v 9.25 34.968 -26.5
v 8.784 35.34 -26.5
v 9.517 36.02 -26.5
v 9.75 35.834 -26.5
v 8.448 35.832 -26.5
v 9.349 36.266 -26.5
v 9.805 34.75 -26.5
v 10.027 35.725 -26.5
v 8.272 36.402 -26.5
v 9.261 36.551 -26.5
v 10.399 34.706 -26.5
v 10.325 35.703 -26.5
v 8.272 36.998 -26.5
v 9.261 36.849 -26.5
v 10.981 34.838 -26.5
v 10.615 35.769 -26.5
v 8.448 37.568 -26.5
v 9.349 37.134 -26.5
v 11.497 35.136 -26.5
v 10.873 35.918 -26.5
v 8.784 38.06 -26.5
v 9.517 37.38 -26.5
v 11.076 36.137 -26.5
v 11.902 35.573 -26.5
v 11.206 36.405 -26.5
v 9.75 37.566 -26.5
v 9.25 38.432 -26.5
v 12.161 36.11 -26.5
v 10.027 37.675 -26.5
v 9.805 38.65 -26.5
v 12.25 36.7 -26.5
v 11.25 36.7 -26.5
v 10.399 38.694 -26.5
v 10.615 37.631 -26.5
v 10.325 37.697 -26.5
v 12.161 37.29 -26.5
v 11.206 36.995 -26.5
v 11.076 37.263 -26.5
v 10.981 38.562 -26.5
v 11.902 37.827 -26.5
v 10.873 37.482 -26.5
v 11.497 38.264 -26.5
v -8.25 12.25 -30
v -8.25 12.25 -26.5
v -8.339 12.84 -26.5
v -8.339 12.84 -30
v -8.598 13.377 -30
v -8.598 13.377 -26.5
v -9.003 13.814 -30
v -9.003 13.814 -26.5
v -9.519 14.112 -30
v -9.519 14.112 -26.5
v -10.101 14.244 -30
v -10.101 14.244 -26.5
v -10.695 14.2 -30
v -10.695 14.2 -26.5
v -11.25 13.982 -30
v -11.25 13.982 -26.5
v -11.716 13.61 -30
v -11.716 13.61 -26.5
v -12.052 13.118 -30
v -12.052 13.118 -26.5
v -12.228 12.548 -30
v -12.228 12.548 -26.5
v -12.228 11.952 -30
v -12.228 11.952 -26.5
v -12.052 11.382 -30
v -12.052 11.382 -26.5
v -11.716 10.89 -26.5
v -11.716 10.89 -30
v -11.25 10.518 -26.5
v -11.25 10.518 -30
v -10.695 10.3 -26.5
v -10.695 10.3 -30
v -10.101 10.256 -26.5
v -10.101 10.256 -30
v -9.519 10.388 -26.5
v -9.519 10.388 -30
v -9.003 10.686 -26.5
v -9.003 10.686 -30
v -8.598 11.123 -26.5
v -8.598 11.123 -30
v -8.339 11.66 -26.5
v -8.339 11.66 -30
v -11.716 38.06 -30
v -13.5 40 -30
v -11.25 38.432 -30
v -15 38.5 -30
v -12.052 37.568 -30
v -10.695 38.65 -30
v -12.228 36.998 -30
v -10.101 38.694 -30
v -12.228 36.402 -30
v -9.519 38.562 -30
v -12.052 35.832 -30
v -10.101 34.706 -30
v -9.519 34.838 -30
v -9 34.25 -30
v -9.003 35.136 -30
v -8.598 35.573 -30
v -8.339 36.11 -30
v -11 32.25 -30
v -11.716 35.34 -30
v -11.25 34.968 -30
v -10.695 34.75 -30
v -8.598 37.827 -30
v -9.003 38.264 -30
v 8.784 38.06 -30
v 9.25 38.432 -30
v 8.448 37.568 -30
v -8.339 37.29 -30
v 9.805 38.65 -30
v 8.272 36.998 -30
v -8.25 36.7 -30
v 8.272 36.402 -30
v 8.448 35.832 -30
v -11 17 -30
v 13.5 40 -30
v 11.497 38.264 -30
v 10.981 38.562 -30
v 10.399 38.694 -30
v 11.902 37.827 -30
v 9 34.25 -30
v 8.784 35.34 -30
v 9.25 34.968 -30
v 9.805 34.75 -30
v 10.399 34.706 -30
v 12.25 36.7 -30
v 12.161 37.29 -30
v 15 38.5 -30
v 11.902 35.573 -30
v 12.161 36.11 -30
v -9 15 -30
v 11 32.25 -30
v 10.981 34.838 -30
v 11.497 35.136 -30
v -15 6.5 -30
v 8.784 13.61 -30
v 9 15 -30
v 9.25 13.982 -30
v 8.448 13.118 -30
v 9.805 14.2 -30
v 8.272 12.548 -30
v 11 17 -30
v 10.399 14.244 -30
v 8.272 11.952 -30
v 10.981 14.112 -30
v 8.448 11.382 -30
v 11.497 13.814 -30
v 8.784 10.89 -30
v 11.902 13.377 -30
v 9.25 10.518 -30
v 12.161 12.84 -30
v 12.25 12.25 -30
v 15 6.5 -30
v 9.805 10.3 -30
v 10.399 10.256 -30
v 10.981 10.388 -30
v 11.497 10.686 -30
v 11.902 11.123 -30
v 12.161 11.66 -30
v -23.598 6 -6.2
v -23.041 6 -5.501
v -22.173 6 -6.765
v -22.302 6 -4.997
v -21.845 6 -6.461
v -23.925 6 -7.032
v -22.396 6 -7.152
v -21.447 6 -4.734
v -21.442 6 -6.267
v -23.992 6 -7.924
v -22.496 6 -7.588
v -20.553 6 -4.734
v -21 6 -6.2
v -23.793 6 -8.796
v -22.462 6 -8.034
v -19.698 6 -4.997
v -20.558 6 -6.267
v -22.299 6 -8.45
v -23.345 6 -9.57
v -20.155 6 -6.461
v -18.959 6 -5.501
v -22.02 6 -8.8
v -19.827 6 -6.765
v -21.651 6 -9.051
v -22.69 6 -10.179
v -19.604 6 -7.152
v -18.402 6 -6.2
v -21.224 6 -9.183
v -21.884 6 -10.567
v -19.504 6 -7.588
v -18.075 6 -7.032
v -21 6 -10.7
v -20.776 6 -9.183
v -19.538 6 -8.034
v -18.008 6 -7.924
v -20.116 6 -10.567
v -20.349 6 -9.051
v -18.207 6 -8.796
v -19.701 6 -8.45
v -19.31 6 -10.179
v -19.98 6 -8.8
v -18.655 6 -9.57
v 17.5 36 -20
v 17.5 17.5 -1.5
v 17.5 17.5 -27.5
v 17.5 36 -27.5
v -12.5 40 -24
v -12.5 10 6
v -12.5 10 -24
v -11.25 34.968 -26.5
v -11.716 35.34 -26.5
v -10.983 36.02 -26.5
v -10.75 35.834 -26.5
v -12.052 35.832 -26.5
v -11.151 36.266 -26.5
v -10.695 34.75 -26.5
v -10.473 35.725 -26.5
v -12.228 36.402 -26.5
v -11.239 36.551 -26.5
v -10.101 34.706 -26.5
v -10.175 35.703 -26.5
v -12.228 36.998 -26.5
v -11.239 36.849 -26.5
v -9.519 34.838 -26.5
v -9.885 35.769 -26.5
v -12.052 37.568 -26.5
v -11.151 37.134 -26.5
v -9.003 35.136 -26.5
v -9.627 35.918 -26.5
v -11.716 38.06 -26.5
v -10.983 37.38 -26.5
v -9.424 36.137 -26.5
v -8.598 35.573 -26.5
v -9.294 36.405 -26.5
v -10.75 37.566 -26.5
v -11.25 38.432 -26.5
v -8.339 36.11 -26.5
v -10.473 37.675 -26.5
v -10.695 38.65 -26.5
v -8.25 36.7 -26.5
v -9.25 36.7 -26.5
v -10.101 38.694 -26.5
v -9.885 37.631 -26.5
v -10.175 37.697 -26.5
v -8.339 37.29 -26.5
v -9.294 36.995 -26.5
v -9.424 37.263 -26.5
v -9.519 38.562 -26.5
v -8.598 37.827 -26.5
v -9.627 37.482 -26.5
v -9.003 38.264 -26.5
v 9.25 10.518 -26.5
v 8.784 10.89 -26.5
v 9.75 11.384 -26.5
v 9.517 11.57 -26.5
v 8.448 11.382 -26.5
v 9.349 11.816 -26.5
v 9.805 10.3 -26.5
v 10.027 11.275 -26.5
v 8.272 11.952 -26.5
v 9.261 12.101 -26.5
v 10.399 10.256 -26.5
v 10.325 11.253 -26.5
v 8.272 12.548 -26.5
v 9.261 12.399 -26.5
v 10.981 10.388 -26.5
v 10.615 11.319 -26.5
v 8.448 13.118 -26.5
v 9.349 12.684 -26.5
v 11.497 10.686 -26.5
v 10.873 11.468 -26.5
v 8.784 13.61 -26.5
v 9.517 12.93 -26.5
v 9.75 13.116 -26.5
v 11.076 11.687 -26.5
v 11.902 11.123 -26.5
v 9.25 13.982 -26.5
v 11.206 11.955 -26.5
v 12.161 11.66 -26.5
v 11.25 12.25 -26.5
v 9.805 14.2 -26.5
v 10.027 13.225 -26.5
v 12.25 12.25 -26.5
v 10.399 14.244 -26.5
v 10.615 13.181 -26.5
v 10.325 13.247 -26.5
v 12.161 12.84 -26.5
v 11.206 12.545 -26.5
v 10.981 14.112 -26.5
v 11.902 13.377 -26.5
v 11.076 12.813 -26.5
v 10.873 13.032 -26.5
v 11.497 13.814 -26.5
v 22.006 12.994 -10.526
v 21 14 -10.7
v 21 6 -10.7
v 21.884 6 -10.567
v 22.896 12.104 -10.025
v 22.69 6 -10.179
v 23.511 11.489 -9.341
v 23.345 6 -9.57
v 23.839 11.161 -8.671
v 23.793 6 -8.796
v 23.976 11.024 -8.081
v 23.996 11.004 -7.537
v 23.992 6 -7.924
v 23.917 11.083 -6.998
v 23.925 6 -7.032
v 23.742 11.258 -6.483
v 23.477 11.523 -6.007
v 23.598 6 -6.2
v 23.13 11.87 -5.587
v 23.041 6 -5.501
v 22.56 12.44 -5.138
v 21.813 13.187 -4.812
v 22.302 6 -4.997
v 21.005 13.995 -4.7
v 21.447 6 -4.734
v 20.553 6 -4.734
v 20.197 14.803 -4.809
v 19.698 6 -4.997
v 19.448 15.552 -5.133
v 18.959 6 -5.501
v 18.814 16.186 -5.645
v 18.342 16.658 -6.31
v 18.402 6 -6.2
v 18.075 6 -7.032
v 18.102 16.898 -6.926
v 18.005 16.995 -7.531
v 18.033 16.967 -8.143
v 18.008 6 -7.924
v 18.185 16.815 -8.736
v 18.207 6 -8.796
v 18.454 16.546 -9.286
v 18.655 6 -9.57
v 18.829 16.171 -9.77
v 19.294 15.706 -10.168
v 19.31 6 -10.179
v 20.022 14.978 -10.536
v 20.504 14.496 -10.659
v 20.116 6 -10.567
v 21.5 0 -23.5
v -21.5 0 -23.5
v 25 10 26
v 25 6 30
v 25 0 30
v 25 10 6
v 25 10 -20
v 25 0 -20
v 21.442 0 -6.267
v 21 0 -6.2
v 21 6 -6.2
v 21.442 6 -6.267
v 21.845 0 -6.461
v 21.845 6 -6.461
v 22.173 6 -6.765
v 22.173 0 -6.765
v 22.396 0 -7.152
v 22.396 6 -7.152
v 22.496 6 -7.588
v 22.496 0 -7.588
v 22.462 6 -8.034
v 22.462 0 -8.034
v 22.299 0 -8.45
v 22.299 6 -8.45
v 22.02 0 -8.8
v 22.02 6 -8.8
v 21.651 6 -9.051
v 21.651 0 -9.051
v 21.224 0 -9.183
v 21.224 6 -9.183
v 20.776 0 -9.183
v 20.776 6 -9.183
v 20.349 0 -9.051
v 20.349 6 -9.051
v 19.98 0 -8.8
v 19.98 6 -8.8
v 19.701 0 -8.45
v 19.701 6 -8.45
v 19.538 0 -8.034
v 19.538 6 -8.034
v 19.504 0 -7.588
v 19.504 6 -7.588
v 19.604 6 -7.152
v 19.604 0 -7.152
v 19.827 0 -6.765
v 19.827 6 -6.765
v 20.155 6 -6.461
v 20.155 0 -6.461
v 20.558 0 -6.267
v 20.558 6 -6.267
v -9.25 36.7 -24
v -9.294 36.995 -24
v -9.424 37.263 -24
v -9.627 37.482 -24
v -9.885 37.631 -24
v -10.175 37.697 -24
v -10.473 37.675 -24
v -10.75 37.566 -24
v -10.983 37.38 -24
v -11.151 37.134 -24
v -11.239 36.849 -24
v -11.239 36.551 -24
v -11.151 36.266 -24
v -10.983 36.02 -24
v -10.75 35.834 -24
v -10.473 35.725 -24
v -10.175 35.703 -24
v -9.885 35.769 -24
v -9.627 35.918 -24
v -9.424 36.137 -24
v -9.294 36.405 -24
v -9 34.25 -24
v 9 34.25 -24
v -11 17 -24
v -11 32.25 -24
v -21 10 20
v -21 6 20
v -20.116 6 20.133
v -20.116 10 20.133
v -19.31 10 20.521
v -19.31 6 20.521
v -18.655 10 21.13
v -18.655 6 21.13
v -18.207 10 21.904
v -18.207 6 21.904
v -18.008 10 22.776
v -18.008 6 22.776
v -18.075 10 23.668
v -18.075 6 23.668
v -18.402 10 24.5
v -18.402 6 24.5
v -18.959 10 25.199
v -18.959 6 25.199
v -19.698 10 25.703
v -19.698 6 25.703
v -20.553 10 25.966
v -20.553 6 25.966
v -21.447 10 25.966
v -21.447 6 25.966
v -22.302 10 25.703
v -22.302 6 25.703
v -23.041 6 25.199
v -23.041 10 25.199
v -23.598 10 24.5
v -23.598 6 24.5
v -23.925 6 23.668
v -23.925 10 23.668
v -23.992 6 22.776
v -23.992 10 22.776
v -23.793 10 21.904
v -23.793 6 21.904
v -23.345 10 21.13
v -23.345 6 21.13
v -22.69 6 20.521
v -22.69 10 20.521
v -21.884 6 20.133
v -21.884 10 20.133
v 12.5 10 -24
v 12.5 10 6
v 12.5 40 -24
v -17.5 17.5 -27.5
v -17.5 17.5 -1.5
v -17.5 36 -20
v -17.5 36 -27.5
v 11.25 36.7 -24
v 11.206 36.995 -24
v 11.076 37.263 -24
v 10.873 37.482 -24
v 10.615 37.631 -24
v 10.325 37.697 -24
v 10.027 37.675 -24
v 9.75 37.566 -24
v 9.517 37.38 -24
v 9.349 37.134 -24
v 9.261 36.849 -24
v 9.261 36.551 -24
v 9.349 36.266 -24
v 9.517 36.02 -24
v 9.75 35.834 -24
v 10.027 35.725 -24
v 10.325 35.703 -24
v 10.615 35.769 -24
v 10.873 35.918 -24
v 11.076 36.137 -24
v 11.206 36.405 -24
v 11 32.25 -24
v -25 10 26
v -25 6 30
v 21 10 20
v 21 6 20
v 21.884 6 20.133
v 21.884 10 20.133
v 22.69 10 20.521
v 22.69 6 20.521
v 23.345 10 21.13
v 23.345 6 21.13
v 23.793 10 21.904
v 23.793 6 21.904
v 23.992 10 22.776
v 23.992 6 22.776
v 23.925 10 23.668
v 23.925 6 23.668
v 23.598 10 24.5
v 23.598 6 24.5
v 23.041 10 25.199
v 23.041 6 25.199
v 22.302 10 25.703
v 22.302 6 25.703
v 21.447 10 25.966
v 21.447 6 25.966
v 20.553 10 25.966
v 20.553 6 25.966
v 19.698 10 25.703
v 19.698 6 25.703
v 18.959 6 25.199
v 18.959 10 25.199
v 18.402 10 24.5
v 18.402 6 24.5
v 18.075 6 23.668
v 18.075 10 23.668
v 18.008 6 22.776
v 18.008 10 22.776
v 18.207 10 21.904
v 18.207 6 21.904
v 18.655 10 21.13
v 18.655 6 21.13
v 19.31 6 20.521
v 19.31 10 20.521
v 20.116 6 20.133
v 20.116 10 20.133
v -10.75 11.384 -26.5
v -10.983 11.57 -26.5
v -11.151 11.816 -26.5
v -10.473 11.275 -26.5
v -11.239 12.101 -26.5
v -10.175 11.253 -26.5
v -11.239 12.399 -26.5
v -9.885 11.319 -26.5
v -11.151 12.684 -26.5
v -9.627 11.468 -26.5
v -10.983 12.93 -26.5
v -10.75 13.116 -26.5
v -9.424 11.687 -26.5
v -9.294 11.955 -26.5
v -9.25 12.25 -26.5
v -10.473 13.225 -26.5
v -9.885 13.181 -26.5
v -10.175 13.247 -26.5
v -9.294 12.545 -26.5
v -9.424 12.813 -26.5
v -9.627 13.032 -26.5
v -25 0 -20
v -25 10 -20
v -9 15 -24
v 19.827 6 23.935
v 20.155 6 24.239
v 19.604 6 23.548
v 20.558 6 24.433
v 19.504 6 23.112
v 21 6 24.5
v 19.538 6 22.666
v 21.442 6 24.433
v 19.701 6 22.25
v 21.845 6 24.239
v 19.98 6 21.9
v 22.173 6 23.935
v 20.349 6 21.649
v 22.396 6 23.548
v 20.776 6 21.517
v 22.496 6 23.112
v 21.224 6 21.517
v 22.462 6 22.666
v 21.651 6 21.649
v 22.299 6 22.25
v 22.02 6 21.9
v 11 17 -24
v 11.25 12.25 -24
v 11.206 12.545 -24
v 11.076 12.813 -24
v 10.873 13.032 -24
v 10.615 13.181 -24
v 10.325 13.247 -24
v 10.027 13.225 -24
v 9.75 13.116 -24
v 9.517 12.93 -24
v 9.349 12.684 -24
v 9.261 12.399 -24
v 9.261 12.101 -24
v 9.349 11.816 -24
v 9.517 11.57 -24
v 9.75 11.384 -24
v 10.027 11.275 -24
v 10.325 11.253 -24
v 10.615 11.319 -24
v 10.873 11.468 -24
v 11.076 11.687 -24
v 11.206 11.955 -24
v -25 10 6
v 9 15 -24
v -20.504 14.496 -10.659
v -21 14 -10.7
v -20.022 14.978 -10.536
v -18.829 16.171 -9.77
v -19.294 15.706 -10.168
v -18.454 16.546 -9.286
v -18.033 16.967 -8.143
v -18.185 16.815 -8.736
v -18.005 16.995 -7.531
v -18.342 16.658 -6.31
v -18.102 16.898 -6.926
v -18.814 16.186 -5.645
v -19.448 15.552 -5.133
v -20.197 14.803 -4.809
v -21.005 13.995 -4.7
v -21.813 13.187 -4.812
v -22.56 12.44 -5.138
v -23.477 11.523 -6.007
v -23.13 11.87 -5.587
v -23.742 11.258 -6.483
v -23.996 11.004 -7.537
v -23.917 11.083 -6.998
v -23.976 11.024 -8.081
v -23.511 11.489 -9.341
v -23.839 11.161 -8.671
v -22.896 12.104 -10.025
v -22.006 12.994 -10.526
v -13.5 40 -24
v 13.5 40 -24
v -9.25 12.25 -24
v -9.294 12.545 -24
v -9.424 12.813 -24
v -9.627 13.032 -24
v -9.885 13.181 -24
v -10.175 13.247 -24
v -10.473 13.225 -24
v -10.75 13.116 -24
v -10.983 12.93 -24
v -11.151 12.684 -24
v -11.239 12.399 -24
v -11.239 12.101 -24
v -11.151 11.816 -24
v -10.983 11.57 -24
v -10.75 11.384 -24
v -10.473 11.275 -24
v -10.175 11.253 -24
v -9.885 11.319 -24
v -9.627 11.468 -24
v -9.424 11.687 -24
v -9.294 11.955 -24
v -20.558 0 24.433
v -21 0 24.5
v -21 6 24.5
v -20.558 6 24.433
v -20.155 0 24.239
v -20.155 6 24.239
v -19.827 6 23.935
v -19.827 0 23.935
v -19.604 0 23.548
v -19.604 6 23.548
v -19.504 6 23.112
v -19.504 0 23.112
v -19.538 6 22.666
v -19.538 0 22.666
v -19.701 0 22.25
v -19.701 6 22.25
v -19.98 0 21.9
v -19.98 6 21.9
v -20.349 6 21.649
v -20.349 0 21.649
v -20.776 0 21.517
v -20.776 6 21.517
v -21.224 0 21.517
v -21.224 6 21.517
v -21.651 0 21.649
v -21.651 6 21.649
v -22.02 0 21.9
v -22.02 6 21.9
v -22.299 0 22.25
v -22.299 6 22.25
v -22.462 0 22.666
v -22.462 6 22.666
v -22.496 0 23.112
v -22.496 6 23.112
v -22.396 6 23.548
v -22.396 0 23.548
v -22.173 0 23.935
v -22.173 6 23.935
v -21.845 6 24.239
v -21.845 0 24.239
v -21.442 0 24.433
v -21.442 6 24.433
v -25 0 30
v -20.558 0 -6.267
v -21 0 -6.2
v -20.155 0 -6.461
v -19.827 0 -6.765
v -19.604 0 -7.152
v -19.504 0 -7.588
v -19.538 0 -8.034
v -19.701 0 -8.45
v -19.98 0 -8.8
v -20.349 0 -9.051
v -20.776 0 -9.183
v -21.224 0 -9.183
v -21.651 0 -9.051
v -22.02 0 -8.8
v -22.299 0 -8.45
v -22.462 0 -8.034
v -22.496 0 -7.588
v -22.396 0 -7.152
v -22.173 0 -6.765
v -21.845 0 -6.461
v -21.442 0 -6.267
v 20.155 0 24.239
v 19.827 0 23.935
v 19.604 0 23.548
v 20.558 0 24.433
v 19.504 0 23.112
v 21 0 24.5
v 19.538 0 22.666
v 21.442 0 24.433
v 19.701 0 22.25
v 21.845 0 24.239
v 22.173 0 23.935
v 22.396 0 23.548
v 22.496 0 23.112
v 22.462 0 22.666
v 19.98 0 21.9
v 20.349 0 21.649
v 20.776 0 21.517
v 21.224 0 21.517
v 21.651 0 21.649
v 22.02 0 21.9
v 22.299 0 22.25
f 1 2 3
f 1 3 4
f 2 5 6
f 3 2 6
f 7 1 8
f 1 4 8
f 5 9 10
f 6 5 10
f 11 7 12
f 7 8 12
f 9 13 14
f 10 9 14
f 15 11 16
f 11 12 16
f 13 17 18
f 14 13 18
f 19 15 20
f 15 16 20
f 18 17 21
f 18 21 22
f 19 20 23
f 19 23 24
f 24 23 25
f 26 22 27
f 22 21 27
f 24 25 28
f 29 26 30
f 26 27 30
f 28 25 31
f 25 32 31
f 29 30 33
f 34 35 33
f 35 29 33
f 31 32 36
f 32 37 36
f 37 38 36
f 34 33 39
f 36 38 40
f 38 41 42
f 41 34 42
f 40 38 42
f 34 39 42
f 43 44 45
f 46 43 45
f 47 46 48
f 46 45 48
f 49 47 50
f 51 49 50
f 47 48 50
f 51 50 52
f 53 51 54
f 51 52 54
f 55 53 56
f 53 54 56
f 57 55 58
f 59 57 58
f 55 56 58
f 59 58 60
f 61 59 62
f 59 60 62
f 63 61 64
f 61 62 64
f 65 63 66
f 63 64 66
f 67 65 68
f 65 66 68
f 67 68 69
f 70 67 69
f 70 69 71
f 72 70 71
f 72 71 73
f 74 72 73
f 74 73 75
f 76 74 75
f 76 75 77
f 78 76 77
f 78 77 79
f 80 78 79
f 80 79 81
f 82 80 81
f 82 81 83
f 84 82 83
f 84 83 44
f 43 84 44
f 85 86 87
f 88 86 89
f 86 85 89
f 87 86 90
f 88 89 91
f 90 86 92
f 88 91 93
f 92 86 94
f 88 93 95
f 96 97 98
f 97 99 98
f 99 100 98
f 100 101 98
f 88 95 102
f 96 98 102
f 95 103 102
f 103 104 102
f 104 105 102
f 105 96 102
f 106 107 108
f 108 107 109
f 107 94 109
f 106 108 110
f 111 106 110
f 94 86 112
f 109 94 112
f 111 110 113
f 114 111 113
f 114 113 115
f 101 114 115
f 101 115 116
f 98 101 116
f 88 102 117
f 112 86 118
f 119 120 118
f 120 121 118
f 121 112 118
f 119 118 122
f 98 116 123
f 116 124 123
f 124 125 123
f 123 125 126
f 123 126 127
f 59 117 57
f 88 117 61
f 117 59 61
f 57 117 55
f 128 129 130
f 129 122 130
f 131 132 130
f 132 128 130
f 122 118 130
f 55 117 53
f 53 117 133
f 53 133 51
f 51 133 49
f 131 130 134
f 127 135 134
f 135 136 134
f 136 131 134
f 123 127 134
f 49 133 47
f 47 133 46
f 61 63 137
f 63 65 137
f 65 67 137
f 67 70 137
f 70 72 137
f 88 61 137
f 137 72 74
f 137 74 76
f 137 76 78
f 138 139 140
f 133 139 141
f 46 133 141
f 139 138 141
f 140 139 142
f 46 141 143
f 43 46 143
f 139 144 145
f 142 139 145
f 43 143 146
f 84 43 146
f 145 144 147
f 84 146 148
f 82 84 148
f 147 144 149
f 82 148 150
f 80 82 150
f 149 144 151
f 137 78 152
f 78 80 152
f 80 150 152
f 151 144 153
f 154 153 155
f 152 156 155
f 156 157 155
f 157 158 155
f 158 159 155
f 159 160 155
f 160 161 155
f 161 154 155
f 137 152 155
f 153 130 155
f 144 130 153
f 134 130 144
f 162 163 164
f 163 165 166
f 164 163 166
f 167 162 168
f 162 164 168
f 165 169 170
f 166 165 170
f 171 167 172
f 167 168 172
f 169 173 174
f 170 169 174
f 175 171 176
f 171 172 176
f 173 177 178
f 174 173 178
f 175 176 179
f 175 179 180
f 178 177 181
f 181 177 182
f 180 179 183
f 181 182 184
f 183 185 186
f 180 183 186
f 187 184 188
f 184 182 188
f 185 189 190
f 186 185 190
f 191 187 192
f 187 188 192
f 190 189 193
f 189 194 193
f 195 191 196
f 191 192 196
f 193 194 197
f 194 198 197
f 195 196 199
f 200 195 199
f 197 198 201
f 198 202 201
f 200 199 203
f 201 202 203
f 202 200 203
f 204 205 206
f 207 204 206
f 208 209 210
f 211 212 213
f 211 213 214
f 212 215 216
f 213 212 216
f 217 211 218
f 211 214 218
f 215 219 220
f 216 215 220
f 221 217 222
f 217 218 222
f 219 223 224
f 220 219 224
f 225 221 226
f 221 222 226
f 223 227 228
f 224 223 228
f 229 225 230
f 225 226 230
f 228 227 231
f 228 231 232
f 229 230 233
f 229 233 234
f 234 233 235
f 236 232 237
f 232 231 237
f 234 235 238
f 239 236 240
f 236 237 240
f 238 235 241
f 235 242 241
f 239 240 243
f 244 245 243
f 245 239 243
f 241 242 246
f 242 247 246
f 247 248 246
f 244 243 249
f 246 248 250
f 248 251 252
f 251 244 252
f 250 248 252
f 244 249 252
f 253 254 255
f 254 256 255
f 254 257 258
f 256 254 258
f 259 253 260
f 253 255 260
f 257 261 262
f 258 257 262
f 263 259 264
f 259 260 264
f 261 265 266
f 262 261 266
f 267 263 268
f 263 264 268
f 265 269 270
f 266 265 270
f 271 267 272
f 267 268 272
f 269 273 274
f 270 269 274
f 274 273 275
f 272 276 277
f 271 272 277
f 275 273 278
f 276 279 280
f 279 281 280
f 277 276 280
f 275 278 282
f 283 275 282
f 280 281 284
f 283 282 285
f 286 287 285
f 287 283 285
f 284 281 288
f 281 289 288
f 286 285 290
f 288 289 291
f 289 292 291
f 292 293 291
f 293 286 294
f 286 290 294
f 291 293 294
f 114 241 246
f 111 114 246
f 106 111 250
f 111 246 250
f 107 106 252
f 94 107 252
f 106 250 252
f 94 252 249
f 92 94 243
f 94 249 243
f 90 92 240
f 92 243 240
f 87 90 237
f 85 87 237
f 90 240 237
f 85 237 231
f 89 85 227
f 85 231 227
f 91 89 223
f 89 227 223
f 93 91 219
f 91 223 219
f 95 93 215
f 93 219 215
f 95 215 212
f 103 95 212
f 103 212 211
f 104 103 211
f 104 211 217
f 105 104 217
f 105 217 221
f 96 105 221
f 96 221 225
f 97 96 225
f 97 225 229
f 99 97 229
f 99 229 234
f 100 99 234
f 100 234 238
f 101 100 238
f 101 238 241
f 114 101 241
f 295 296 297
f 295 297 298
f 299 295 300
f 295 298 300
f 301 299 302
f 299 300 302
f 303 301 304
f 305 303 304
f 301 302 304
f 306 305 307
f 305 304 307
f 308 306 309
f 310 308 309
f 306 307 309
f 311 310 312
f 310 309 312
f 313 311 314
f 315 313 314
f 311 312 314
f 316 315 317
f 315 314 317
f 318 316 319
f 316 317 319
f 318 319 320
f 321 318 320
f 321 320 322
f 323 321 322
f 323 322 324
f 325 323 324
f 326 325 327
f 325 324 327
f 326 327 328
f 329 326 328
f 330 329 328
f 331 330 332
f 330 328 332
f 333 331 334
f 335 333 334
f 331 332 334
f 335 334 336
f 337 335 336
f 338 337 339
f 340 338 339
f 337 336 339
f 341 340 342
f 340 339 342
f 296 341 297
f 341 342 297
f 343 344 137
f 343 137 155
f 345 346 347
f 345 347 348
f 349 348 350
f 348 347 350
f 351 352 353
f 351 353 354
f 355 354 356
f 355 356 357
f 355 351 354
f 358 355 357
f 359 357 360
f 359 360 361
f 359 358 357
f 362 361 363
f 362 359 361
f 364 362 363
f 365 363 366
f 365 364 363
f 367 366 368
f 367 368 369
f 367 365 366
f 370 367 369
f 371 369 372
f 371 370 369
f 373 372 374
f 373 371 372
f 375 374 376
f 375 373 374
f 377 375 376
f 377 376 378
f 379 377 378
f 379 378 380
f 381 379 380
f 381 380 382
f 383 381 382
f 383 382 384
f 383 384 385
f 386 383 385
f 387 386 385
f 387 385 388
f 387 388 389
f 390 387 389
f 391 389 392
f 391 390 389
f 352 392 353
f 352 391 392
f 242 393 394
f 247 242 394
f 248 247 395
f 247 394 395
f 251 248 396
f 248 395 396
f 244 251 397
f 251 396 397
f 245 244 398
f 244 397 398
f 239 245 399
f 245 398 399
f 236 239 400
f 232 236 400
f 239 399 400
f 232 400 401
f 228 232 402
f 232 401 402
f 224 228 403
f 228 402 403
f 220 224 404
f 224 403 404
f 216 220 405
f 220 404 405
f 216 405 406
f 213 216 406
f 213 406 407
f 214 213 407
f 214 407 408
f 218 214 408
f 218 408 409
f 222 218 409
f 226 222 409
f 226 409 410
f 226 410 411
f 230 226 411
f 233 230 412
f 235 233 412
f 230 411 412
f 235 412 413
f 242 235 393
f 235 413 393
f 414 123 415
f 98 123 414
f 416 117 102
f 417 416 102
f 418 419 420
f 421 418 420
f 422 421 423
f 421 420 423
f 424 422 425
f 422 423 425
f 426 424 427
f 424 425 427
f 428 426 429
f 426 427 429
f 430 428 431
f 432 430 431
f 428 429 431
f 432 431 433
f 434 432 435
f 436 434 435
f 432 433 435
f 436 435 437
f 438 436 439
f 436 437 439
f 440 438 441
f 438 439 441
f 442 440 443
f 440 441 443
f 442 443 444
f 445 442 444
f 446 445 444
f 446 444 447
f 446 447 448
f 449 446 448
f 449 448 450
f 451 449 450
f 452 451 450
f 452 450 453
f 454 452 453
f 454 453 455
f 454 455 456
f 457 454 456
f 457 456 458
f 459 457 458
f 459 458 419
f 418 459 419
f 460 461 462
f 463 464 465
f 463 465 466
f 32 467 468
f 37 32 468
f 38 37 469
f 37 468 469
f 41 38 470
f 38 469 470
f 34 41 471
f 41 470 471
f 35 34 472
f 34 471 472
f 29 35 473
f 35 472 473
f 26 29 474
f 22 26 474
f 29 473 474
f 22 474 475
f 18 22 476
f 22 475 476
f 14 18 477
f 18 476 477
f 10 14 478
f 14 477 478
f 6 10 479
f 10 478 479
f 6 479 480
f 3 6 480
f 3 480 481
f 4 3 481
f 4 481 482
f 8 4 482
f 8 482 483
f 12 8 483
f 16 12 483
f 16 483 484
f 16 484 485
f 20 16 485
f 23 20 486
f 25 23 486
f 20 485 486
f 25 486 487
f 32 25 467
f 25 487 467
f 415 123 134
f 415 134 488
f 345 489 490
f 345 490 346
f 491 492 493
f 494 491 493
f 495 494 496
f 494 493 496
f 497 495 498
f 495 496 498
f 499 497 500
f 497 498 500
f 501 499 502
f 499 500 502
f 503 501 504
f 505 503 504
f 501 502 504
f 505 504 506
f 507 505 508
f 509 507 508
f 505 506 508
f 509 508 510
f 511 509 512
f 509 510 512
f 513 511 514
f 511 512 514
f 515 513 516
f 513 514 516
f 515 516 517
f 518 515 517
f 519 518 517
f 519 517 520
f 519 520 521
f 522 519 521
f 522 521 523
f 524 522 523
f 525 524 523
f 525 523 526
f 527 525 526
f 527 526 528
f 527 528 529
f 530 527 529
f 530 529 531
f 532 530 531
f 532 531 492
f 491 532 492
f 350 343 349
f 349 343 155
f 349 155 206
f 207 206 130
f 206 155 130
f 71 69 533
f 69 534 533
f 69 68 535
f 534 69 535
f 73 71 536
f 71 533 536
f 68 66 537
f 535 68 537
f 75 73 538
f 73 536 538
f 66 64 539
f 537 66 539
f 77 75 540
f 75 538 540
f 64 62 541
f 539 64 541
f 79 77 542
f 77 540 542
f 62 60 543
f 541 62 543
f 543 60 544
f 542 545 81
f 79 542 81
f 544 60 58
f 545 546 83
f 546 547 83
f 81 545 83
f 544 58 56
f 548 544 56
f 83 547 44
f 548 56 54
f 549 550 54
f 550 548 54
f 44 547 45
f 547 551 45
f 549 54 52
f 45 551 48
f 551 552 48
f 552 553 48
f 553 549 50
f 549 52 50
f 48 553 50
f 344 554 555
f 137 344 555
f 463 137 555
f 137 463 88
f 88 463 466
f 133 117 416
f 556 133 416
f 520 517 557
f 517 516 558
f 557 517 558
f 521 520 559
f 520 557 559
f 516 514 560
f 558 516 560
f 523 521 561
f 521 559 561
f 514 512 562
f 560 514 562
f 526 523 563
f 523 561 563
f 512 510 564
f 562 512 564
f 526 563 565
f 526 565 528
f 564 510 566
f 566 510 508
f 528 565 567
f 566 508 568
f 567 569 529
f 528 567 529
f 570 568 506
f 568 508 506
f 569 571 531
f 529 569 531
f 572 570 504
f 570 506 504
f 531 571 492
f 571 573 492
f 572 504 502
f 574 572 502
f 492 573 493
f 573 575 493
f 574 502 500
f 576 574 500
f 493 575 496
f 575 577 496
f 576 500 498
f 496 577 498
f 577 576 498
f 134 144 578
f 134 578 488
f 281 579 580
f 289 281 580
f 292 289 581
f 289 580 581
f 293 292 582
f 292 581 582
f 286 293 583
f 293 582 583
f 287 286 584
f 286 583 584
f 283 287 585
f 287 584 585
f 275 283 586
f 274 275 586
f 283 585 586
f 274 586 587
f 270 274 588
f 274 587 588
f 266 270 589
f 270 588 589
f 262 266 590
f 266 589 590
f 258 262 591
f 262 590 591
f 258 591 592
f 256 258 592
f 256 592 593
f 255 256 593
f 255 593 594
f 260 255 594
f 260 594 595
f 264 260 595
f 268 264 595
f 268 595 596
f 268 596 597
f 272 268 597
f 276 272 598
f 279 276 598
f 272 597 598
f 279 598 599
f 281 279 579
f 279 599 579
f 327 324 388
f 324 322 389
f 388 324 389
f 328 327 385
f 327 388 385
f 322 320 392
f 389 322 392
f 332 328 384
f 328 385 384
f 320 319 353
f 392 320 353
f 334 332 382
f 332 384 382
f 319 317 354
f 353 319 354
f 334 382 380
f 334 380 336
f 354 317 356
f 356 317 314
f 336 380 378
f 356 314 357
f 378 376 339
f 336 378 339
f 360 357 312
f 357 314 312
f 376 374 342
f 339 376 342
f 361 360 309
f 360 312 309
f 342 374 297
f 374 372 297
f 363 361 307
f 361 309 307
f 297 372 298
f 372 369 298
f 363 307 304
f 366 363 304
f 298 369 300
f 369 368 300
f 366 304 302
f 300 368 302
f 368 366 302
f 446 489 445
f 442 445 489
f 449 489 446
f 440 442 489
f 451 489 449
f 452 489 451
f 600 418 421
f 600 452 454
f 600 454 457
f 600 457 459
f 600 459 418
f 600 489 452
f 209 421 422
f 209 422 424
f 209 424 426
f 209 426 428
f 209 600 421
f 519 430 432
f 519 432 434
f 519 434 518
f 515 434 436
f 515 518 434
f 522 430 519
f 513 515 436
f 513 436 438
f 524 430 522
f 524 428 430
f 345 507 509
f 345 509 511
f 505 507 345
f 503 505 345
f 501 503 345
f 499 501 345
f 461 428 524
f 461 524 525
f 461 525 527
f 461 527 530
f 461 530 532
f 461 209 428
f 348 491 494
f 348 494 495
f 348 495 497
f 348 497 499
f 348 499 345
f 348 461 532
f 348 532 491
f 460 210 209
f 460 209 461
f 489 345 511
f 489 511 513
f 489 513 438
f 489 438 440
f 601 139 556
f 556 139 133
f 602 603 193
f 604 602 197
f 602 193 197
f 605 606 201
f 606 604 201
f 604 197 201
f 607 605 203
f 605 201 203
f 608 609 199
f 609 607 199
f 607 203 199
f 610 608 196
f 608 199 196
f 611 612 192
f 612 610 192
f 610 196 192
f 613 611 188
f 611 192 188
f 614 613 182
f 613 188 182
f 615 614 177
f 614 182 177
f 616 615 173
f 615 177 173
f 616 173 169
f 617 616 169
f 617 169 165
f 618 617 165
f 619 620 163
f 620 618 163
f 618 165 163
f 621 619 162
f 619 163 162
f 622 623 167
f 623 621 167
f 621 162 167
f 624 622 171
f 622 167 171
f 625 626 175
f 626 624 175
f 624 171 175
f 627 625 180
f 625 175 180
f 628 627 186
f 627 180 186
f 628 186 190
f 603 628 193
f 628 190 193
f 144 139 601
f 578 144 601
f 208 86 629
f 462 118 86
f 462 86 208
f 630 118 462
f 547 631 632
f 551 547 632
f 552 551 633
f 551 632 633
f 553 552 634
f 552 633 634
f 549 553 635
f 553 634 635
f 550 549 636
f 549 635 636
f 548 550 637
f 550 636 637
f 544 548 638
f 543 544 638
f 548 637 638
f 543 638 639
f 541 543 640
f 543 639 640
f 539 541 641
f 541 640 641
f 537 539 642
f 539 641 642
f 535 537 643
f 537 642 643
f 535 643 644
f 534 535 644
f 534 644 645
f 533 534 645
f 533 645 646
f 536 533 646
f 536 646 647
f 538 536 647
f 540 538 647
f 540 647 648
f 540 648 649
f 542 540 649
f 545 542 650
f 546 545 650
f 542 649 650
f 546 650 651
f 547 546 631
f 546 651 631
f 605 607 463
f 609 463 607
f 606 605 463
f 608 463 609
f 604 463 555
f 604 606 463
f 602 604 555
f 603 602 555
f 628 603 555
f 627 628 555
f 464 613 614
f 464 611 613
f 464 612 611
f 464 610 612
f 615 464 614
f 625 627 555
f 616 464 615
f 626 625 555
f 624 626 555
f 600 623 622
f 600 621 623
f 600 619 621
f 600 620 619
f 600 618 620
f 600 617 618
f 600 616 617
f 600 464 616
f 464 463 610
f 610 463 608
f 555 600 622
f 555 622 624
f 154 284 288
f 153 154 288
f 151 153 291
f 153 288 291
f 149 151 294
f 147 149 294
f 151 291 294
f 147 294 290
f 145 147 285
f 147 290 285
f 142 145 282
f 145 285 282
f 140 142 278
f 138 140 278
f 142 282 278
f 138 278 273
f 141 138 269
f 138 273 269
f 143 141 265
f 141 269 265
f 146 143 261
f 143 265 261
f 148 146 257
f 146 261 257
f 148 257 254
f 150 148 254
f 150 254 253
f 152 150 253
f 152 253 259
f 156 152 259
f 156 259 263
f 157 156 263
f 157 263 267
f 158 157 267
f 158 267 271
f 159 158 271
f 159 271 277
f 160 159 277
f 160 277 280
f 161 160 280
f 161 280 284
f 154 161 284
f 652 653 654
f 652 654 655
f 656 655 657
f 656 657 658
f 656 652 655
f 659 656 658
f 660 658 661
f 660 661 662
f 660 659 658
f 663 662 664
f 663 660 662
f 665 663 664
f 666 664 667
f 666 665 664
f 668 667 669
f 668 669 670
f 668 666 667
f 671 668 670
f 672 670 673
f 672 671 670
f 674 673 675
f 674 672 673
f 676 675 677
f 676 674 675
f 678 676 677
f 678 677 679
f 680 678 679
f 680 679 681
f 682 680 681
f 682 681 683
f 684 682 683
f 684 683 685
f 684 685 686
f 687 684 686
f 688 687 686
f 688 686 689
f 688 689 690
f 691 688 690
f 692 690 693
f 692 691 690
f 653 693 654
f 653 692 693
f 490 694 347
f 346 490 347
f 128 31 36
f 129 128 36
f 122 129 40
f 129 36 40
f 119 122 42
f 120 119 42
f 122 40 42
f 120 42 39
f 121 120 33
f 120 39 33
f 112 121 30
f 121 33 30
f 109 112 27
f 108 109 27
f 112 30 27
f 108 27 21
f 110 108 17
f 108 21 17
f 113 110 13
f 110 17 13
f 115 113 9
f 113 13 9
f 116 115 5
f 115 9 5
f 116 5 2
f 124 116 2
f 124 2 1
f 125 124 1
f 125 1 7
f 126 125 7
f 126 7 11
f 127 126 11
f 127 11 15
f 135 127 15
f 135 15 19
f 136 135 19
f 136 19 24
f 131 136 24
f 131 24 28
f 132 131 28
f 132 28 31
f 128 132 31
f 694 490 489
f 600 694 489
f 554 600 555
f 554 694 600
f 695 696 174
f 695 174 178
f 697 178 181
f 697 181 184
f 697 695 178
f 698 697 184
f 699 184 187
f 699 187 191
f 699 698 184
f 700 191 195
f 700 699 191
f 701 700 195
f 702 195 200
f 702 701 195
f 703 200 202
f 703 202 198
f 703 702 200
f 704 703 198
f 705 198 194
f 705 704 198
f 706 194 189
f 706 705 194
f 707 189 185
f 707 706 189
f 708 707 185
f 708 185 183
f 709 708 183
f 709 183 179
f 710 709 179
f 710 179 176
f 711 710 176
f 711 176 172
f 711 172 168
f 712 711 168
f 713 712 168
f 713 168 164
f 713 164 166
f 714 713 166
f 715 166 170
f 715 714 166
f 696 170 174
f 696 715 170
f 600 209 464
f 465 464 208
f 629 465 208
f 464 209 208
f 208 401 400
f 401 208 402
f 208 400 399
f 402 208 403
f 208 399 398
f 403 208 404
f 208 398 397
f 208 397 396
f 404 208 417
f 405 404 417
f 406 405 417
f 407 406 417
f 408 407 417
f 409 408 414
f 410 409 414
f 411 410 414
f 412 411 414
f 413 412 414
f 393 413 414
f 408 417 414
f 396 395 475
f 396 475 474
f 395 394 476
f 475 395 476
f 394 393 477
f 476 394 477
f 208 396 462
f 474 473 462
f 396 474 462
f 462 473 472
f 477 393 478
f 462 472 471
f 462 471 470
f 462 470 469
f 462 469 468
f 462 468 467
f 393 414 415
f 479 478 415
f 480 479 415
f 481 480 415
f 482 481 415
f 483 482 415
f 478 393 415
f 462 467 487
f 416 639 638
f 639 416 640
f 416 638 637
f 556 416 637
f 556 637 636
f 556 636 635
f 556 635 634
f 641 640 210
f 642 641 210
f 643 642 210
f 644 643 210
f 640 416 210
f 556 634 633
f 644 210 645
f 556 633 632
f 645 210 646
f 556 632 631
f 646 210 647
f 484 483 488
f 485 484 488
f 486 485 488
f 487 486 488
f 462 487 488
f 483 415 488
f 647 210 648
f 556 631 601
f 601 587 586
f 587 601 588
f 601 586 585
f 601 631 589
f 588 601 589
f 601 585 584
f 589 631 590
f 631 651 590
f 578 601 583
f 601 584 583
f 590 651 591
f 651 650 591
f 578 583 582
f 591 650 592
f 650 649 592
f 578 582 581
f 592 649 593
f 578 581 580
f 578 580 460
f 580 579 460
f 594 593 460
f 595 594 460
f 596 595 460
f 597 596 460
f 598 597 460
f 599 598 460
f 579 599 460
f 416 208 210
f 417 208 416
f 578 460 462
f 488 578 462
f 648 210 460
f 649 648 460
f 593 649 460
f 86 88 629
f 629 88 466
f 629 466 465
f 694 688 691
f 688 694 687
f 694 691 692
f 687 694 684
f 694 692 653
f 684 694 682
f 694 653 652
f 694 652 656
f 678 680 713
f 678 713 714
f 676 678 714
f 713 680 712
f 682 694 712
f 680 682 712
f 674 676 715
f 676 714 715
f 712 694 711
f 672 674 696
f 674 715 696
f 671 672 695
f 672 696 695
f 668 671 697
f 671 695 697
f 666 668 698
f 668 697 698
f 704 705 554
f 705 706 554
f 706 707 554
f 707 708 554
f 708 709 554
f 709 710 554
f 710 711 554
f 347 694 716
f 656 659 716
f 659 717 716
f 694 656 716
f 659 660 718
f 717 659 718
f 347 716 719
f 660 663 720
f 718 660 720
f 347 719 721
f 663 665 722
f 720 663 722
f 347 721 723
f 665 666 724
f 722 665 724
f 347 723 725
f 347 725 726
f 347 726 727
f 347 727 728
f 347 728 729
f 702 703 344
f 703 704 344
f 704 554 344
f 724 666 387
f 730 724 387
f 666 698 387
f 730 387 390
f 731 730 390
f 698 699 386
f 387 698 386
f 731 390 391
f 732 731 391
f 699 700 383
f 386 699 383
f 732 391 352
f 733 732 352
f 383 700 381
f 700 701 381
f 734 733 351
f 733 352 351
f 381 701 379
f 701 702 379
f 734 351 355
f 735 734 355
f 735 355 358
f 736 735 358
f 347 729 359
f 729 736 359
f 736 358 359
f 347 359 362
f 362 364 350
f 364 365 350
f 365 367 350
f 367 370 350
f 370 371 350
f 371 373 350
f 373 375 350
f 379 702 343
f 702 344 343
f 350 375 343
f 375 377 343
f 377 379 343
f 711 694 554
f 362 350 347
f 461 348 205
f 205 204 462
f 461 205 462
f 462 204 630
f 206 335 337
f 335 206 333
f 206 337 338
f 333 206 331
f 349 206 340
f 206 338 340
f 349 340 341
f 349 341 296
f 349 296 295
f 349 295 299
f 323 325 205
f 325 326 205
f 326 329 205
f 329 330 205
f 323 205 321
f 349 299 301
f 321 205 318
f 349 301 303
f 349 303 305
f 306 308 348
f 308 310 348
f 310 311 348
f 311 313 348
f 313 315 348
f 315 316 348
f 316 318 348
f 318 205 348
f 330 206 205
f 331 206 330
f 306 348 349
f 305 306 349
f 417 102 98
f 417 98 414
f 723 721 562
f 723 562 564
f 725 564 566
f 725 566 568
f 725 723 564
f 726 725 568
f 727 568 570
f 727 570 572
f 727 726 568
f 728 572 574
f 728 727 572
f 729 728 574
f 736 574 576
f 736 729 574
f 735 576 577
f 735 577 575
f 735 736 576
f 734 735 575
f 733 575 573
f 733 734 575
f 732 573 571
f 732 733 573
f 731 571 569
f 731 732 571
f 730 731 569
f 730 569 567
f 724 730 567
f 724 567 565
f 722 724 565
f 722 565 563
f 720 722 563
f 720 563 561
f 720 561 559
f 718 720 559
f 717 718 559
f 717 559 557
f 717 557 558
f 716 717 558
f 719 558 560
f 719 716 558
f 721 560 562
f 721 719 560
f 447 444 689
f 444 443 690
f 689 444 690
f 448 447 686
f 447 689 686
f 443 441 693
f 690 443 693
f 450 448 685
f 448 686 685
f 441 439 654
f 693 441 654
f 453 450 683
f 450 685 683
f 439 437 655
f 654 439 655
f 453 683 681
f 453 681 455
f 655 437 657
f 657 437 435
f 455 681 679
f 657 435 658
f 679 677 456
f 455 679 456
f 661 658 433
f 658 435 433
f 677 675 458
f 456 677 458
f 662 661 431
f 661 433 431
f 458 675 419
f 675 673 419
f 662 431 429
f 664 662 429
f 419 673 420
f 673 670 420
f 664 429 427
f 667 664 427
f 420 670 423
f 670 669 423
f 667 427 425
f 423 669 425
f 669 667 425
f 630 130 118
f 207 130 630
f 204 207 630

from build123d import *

# Parameters (mm, degrees)
SKETCH1_W           = 50
SKETCH1_H           = 60
BOSS_EXTRUDE1_DEPTH = 10
SKETCH2_R           = 1.5
CUT_EXTRUDE1_DEPTH  = 6
CUT_EXTRUDE2_REACH  = 41.509
SKETCH3_R           = 3
SKETCH5_W           = 25
SKETCH5_H           = 6
BOSS_EXTRUDE3_DEPTH = 30
CUT_EXTRUDE3_REACH  = 78.322
SKETCH6_W           = 22
SKETCH6_H           = 19.25
SKETCH7_R           = 1
CUT_EXTRUDE4_DEPTH  = 2.5
CUT_EXTRUDE5_REACH  = 75.602
SKETCH8_R           = 2
BOSS_EXTRUDE4_DEPTH = 5
CHAMFER1_SIZE       = 7.5
CHAMFER2_SIZE       = 10
CHAMFER4_SIZE       = 6.5
CHAMFER5_SIZE       = 4
CHAMFER6_SIZE       = 4
CHAMFER7_SIZE       = 2


# Some blends are built 0.0001 mm under size
with BuildPart() as part:
    # Sketch1 → Boss-Extrude1 (new body)
    with BuildSketch(Plane(origin=(0, 0, 0), x_dir=(1, 0, 0), z_dir=(0, 1, 0))):
        Rectangle(SKETCH1_W, SKETCH1_H)
    extrude(amount=BOSS_EXTRUDE1_DEPTH)

    # Sketch2 → Cut-Extrude1 (cut)
    with BuildSketch(Plane(origin=(0, 0, 0), x_dir=(1, 0, 0), z_dir=(0, 1, 0))):
        with Locations(Location((-21, 7.7, 0), (0, 0, 270))):
            Circle(SKETCH2_R)
        with Locations(Location((-21, -23, 0), (0, 0, 270))):
            Circle(SKETCH2_R)
        with Locations(Location((21, 7.7, 0), (0, 0, 270))):
            Circle(SKETCH2_R)
        with Locations(Location((21, -23, 0), (0, 0, 270))):
            Circle(SKETCH2_R)
    extrude(amount=CUT_EXTRUDE1_DEPTH, mode=Mode.SUBTRACT)

    # Sketch3 → Cut-Extrude2 (cut, up to next)
    with BuildSketch(Plane.XZ.offset(-6), mode=Mode.PRIVATE) as cut_extrude2_sk1:
        with Locations(Location((-21, 23, 0), (0, 0, 270))):
            Circle(SKETCH3_R)
    cut_extrude2_tool1 = extrude(cut_extrude2_sk1.sketch, amount=-CUT_EXTRUDE2_REACH, mode=Mode.PRIVATE) & part.part
    # Sketch3 → Cut-Extrude2 (cut, up to next)
    with BuildSketch(Plane.XZ.offset(-6), mode=Mode.PRIVATE) as cut_extrude2_sk2:
        with Locations(Location((21, 23, 0), (0, 0, 270))):
            Circle(SKETCH3_R)
    cut_extrude2_tool2 = extrude(cut_extrude2_sk2.sketch, amount=-CUT_EXTRUDE2_REACH, mode=Mode.PRIVATE) & part.part
    # Sketch3 → Cut-Extrude2 (cut, up to next)
    with BuildSketch(Plane.XZ.offset(-6), mode=Mode.PRIVATE) as cut_extrude2_sk3:
        with Locations(Location((21, -7.7, 0), (0, 0, 270))):
            Circle(SKETCH3_R)
    cut_extrude2_tool3 = extrude(cut_extrude2_sk3.sketch, amount=-CUT_EXTRUDE2_REACH, mode=Mode.PRIVATE) & part.part
    # Sketch3 → Cut-Extrude2 (cut, up to next)
    with BuildSketch(Plane.XZ.offset(-6), mode=Mode.PRIVATE) as cut_extrude2_sk4:
        with Locations(Location((-21, -7.7, 0), (0, 0, 270))):
            Circle(SKETCH3_R)
    cut_extrude2_tool4 = extrude(cut_extrude2_sk4.sketch, amount=-CUT_EXTRUDE2_REACH, mode=Mode.PRIVATE) & part.part
    add(cut_extrude2_tool1.solids().sort_by_distance((-21, 6, 23))[0], mode=Mode.SUBTRACT)
    add(cut_extrude2_tool2.solids().sort_by_distance((21, 6, 23))[0], mode=Mode.SUBTRACT)
    add(cut_extrude2_tool3.solids().sort_by_distance((21, 6, -7.7))[0], mode=Mode.SUBTRACT)
    add(cut_extrude2_tool4.solids().sort_by_distance((-21, 6, -7.7))[0], mode=Mode.SUBTRACT)

    # Sketch5 → Boss-Extrude3 (add)
    with BuildSketch(Plane(origin=(0, 10, 0), x_dir=(1, 0, 0), z_dir=(0, 1, 0))):
        with Locations((0, 27)):
            Rectangle(SKETCH5_W, SKETCH5_H)
    extrude(amount=BOSS_EXTRUDE3_DEPTH)

    # Sketch6 → Cut-Extrude3 (cut, up to next)
    with BuildSketch(Plane(origin=(0, 0, -30), x_dir=(-1, 0, 0), z_dir=(0, 0, -1)), mode=Mode.PRIVATE) as cut_extrude3_sk1:
        with Locations((0, 24.625)):
            Rectangle(SKETCH6_W, SKETCH6_H)
    cut_extrude3_tool1 = extrude(cut_extrude3_sk1.sketch, amount=-CUT_EXTRUDE3_REACH, mode=Mode.PRIVATE) & part.part
    add(cut_extrude3_tool1.solids().sort_by_distance((0, 24.625, -30))[0], mode=Mode.SUBTRACT)

    # Sketch7 → Cut-Extrude4 (cut)
    with BuildSketch(Plane.XY.offset(-24)):
        with Locations((10.25, 12.25)):
            Circle(SKETCH7_R)
        with Locations((-10.25, 12.25)):
            Circle(SKETCH7_R)
        with Locations((-10.25, 36.7)):
            Circle(SKETCH7_R)
        with Locations((10.25, 36.7)):
            Circle(SKETCH7_R)
    extrude(amount=-CUT_EXTRUDE4_DEPTH, mode=Mode.SUBTRACT)

    # Sketch8 → Cut-Extrude5 (cut, up to next)
    with BuildSketch(Plane.XY.offset(-26.5), mode=Mode.PRIVATE) as cut_extrude5_sk1:
        with Locations((-10.25, 36.7)):
            Circle(SKETCH8_R)
    cut_extrude5_tool1 = extrude(cut_extrude5_sk1.sketch, amount=-CUT_EXTRUDE5_REACH, mode=Mode.PRIVATE) & part.part
    # Sketch8 → Cut-Extrude5 (cut, up to next)
    with BuildSketch(Plane.XY.offset(-26.5), mode=Mode.PRIVATE) as cut_extrude5_sk2:
        with Locations((10.25, 36.7)):
            Circle(SKETCH8_R)
    cut_extrude5_tool2 = extrude(cut_extrude5_sk2.sketch, amount=-CUT_EXTRUDE5_REACH, mode=Mode.PRIVATE) & part.part
    # Sketch8 → Cut-Extrude5 (cut, up to next)
    with BuildSketch(Plane.XY.offset(-26.5), mode=Mode.PRIVATE) as cut_extrude5_sk3:
        with Locations((10.25, 12.25)):
            Circle(SKETCH8_R)
    cut_extrude5_tool3 = extrude(cut_extrude5_sk3.sketch, amount=-CUT_EXTRUDE5_REACH, mode=Mode.PRIVATE) & part.part
    # Sketch8 → Cut-Extrude5 (cut, up to next)
    with BuildSketch(Plane.XY.offset(-26.5), mode=Mode.PRIVATE) as cut_extrude5_sk4:
        with Locations((-10.25, 12.25)):
            Circle(SKETCH8_R)
    cut_extrude5_tool4 = extrude(cut_extrude5_sk4.sketch, amount=-CUT_EXTRUDE5_REACH, mode=Mode.PRIVATE) & part.part
    add(cut_extrude5_tool1.solids().sort_by_distance((-10.25, 36.7, -26.5))[0], mode=Mode.SUBTRACT)
    add(cut_extrude5_tool2.solids().sort_by_distance((10.25, 36.7, -26.5))[0], mode=Mode.SUBTRACT)
    add(cut_extrude5_tool3.solids().sort_by_distance((10.25, 12.25, -26.5))[0], mode=Mode.SUBTRACT)
    add(cut_extrude5_tool4.solids().sort_by_distance((-10.25, 12.25, -26.5))[0], mode=Mode.SUBTRACT)

    # Sketch9 → Boss-Extrude4 (add)
    with BuildSketch(Plane(origin=(12.5, 0, 0), x_dir=(0, 0, -1), z_dir=(1, 0, 0))):
        Polygon((30, 40), (24, 40), (-6, 10), (30, 10), align=None)
    boss_extrude4 = extrude(amount=BOSS_EXTRUDE4_DEPTH)

    # Mirror1: Boss-Extrude4 across plane
    add(boss_extrude4.mirror(Plane(origin=(0, 0, 0), x_dir=(0, 0, 1), z_dir=(1, 0, 0))))

    # Chamfer1
    # the kernel refuses this chamfer: 7.5 mm, written as the material it adds along each edge
    with BuildSketch(Plane(origin=(17.5, 10, 25.28762241), x_dir=(-0.02749587661058632, 0.9996219169112968, 0), z_dir=(0, 0, -1))) as chamfer1_piece_1_section:
        Polygon((CHAMFER1_SIZE * 0.999621916911, CHAMFER1_SIZE * 0.0274958766106), (-CHAMFER1_SIZE * 0.0274958766106, CHAMFER1_SIZE * 0.999621916911), (0, 0), align=None)
    chamfer1_piece_1 = extrude(amount=55.28762241, mode=Mode.PRIVATE)
    chamfer1_piece_1 = split(chamfer1_piece_1, bisect_by=Plane(origin=(19.963540821, 21.141387269, -5.141387269), z_dir=(0, -0.7071067811865512, -0.7071067811865438)), keep=Keep.TOP, mode=Mode.PRIVATE)
    chamfer1_piece_1 = chamfer1_piece_1 - Plane(origin=(21, 12.394681138, -7.7), x_dir=(0, 0, -1), z_dir=(0, -1, 0)) * Cylinder(3, 141, mode=Mode.PRIVATE)
    chamfer1_piece_1 = split(chamfer1_piece_1, bisect_by=Plane(origin=(25, 12.394681138, -13.888093401), z_dir=(-1, 0, 0)), keep=Keep.TOP, mode=Mode.PRIVATE)
    add(chamfer1_piece_1)
    with BuildSketch(Plane(origin=(-17.5, 10, 25.28762241), x_dir=(0.02749587661058632, 0.9996219169112968, 0), z_dir=(0, 0, -1))) as chamfer1_piece_2_section:
        Polygon((CHAMFER1_SIZE * 0.999621916911, -CHAMFER1_SIZE * 0.0274958766106), (-CHAMFER1_SIZE * 0.0274958766106, -CHAMFER1_SIZE * 0.999621916911), (0, 0), align=None)
    chamfer1_piece_2 = extrude(amount=55.28762241, mode=Mode.PRIVATE)
    chamfer1_piece_2 = split(chamfer1_piece_2, bisect_by=Plane(origin=(-19.963548268, 21.141369022, -5.141369022), z_dir=(0, -0.7071067811865512, -0.7071067811865438)), keep=Keep.TOP, mode=Mode.PRIVATE)
    chamfer1_piece_2 = chamfer1_piece_2 - Plane(origin=(-21, 12.394672857, -7.7), x_dir=(0, 0, -1), z_dir=(0, -1, 0)) * Cylinder(3, 141, mode=Mode.PRIVATE)
    chamfer1_piece_2 = split(chamfer1_piece_2, bisect_by=Plane(origin=(-25, 12.394672857, -13.888065186), z_dir=(1, 0, 0)), keep=Keep.TOP, mode=Mode.PRIVATE)
    add(chamfer1_piece_2)

    # Chamfer2
    chamfer2_edges = [part.edges().sort_by_distance(p)[0] for p in [
        (-25, 5, -30),
        (25, 5, -30),
    ]]
    chamfer(chamfer2_edges, length=CHAMFER2_SIZE)

    # Chamfer4
    chamfer4_edges = [part.edges().sort_by_distance(p)[0] for p in [
        (0, 0, -30),
    ]]
    chamfer(chamfer4_edges, length=CHAMFER4_SIZE)

    # Chamfer5
    chamfer5_edges = [part.edges().sort_by_distance(p)[0] for p in [
        (17.5, 40, -25.75),
        (-17.5, 40, -25.75),
    ]]
    chamfer(chamfer5_edges, length=CHAMFER5_SIZE)

    # Chamfer6
    chamfer6_edges = [part.edges().sort_by_distance(p)[0] for p in [
        (0, 10, 30),
    ]]
    chamfer(chamfer6_edges, length=CHAMFER6_SIZE - 0.0001)  # a hair under: the kernel refuses the full size

    # Chamfer7
    chamfer7_edges = [part.edges().sort_by_distance(p)[0] for p in [
        (-11, 34.25, -27),
        (-11, 15, -27),
        (11, 15, -27),
        (11, 34.25, -27),
    ]]
    chamfer(chamfer7_edges, length=CHAMFER7_SIZE)


solid = part.part
